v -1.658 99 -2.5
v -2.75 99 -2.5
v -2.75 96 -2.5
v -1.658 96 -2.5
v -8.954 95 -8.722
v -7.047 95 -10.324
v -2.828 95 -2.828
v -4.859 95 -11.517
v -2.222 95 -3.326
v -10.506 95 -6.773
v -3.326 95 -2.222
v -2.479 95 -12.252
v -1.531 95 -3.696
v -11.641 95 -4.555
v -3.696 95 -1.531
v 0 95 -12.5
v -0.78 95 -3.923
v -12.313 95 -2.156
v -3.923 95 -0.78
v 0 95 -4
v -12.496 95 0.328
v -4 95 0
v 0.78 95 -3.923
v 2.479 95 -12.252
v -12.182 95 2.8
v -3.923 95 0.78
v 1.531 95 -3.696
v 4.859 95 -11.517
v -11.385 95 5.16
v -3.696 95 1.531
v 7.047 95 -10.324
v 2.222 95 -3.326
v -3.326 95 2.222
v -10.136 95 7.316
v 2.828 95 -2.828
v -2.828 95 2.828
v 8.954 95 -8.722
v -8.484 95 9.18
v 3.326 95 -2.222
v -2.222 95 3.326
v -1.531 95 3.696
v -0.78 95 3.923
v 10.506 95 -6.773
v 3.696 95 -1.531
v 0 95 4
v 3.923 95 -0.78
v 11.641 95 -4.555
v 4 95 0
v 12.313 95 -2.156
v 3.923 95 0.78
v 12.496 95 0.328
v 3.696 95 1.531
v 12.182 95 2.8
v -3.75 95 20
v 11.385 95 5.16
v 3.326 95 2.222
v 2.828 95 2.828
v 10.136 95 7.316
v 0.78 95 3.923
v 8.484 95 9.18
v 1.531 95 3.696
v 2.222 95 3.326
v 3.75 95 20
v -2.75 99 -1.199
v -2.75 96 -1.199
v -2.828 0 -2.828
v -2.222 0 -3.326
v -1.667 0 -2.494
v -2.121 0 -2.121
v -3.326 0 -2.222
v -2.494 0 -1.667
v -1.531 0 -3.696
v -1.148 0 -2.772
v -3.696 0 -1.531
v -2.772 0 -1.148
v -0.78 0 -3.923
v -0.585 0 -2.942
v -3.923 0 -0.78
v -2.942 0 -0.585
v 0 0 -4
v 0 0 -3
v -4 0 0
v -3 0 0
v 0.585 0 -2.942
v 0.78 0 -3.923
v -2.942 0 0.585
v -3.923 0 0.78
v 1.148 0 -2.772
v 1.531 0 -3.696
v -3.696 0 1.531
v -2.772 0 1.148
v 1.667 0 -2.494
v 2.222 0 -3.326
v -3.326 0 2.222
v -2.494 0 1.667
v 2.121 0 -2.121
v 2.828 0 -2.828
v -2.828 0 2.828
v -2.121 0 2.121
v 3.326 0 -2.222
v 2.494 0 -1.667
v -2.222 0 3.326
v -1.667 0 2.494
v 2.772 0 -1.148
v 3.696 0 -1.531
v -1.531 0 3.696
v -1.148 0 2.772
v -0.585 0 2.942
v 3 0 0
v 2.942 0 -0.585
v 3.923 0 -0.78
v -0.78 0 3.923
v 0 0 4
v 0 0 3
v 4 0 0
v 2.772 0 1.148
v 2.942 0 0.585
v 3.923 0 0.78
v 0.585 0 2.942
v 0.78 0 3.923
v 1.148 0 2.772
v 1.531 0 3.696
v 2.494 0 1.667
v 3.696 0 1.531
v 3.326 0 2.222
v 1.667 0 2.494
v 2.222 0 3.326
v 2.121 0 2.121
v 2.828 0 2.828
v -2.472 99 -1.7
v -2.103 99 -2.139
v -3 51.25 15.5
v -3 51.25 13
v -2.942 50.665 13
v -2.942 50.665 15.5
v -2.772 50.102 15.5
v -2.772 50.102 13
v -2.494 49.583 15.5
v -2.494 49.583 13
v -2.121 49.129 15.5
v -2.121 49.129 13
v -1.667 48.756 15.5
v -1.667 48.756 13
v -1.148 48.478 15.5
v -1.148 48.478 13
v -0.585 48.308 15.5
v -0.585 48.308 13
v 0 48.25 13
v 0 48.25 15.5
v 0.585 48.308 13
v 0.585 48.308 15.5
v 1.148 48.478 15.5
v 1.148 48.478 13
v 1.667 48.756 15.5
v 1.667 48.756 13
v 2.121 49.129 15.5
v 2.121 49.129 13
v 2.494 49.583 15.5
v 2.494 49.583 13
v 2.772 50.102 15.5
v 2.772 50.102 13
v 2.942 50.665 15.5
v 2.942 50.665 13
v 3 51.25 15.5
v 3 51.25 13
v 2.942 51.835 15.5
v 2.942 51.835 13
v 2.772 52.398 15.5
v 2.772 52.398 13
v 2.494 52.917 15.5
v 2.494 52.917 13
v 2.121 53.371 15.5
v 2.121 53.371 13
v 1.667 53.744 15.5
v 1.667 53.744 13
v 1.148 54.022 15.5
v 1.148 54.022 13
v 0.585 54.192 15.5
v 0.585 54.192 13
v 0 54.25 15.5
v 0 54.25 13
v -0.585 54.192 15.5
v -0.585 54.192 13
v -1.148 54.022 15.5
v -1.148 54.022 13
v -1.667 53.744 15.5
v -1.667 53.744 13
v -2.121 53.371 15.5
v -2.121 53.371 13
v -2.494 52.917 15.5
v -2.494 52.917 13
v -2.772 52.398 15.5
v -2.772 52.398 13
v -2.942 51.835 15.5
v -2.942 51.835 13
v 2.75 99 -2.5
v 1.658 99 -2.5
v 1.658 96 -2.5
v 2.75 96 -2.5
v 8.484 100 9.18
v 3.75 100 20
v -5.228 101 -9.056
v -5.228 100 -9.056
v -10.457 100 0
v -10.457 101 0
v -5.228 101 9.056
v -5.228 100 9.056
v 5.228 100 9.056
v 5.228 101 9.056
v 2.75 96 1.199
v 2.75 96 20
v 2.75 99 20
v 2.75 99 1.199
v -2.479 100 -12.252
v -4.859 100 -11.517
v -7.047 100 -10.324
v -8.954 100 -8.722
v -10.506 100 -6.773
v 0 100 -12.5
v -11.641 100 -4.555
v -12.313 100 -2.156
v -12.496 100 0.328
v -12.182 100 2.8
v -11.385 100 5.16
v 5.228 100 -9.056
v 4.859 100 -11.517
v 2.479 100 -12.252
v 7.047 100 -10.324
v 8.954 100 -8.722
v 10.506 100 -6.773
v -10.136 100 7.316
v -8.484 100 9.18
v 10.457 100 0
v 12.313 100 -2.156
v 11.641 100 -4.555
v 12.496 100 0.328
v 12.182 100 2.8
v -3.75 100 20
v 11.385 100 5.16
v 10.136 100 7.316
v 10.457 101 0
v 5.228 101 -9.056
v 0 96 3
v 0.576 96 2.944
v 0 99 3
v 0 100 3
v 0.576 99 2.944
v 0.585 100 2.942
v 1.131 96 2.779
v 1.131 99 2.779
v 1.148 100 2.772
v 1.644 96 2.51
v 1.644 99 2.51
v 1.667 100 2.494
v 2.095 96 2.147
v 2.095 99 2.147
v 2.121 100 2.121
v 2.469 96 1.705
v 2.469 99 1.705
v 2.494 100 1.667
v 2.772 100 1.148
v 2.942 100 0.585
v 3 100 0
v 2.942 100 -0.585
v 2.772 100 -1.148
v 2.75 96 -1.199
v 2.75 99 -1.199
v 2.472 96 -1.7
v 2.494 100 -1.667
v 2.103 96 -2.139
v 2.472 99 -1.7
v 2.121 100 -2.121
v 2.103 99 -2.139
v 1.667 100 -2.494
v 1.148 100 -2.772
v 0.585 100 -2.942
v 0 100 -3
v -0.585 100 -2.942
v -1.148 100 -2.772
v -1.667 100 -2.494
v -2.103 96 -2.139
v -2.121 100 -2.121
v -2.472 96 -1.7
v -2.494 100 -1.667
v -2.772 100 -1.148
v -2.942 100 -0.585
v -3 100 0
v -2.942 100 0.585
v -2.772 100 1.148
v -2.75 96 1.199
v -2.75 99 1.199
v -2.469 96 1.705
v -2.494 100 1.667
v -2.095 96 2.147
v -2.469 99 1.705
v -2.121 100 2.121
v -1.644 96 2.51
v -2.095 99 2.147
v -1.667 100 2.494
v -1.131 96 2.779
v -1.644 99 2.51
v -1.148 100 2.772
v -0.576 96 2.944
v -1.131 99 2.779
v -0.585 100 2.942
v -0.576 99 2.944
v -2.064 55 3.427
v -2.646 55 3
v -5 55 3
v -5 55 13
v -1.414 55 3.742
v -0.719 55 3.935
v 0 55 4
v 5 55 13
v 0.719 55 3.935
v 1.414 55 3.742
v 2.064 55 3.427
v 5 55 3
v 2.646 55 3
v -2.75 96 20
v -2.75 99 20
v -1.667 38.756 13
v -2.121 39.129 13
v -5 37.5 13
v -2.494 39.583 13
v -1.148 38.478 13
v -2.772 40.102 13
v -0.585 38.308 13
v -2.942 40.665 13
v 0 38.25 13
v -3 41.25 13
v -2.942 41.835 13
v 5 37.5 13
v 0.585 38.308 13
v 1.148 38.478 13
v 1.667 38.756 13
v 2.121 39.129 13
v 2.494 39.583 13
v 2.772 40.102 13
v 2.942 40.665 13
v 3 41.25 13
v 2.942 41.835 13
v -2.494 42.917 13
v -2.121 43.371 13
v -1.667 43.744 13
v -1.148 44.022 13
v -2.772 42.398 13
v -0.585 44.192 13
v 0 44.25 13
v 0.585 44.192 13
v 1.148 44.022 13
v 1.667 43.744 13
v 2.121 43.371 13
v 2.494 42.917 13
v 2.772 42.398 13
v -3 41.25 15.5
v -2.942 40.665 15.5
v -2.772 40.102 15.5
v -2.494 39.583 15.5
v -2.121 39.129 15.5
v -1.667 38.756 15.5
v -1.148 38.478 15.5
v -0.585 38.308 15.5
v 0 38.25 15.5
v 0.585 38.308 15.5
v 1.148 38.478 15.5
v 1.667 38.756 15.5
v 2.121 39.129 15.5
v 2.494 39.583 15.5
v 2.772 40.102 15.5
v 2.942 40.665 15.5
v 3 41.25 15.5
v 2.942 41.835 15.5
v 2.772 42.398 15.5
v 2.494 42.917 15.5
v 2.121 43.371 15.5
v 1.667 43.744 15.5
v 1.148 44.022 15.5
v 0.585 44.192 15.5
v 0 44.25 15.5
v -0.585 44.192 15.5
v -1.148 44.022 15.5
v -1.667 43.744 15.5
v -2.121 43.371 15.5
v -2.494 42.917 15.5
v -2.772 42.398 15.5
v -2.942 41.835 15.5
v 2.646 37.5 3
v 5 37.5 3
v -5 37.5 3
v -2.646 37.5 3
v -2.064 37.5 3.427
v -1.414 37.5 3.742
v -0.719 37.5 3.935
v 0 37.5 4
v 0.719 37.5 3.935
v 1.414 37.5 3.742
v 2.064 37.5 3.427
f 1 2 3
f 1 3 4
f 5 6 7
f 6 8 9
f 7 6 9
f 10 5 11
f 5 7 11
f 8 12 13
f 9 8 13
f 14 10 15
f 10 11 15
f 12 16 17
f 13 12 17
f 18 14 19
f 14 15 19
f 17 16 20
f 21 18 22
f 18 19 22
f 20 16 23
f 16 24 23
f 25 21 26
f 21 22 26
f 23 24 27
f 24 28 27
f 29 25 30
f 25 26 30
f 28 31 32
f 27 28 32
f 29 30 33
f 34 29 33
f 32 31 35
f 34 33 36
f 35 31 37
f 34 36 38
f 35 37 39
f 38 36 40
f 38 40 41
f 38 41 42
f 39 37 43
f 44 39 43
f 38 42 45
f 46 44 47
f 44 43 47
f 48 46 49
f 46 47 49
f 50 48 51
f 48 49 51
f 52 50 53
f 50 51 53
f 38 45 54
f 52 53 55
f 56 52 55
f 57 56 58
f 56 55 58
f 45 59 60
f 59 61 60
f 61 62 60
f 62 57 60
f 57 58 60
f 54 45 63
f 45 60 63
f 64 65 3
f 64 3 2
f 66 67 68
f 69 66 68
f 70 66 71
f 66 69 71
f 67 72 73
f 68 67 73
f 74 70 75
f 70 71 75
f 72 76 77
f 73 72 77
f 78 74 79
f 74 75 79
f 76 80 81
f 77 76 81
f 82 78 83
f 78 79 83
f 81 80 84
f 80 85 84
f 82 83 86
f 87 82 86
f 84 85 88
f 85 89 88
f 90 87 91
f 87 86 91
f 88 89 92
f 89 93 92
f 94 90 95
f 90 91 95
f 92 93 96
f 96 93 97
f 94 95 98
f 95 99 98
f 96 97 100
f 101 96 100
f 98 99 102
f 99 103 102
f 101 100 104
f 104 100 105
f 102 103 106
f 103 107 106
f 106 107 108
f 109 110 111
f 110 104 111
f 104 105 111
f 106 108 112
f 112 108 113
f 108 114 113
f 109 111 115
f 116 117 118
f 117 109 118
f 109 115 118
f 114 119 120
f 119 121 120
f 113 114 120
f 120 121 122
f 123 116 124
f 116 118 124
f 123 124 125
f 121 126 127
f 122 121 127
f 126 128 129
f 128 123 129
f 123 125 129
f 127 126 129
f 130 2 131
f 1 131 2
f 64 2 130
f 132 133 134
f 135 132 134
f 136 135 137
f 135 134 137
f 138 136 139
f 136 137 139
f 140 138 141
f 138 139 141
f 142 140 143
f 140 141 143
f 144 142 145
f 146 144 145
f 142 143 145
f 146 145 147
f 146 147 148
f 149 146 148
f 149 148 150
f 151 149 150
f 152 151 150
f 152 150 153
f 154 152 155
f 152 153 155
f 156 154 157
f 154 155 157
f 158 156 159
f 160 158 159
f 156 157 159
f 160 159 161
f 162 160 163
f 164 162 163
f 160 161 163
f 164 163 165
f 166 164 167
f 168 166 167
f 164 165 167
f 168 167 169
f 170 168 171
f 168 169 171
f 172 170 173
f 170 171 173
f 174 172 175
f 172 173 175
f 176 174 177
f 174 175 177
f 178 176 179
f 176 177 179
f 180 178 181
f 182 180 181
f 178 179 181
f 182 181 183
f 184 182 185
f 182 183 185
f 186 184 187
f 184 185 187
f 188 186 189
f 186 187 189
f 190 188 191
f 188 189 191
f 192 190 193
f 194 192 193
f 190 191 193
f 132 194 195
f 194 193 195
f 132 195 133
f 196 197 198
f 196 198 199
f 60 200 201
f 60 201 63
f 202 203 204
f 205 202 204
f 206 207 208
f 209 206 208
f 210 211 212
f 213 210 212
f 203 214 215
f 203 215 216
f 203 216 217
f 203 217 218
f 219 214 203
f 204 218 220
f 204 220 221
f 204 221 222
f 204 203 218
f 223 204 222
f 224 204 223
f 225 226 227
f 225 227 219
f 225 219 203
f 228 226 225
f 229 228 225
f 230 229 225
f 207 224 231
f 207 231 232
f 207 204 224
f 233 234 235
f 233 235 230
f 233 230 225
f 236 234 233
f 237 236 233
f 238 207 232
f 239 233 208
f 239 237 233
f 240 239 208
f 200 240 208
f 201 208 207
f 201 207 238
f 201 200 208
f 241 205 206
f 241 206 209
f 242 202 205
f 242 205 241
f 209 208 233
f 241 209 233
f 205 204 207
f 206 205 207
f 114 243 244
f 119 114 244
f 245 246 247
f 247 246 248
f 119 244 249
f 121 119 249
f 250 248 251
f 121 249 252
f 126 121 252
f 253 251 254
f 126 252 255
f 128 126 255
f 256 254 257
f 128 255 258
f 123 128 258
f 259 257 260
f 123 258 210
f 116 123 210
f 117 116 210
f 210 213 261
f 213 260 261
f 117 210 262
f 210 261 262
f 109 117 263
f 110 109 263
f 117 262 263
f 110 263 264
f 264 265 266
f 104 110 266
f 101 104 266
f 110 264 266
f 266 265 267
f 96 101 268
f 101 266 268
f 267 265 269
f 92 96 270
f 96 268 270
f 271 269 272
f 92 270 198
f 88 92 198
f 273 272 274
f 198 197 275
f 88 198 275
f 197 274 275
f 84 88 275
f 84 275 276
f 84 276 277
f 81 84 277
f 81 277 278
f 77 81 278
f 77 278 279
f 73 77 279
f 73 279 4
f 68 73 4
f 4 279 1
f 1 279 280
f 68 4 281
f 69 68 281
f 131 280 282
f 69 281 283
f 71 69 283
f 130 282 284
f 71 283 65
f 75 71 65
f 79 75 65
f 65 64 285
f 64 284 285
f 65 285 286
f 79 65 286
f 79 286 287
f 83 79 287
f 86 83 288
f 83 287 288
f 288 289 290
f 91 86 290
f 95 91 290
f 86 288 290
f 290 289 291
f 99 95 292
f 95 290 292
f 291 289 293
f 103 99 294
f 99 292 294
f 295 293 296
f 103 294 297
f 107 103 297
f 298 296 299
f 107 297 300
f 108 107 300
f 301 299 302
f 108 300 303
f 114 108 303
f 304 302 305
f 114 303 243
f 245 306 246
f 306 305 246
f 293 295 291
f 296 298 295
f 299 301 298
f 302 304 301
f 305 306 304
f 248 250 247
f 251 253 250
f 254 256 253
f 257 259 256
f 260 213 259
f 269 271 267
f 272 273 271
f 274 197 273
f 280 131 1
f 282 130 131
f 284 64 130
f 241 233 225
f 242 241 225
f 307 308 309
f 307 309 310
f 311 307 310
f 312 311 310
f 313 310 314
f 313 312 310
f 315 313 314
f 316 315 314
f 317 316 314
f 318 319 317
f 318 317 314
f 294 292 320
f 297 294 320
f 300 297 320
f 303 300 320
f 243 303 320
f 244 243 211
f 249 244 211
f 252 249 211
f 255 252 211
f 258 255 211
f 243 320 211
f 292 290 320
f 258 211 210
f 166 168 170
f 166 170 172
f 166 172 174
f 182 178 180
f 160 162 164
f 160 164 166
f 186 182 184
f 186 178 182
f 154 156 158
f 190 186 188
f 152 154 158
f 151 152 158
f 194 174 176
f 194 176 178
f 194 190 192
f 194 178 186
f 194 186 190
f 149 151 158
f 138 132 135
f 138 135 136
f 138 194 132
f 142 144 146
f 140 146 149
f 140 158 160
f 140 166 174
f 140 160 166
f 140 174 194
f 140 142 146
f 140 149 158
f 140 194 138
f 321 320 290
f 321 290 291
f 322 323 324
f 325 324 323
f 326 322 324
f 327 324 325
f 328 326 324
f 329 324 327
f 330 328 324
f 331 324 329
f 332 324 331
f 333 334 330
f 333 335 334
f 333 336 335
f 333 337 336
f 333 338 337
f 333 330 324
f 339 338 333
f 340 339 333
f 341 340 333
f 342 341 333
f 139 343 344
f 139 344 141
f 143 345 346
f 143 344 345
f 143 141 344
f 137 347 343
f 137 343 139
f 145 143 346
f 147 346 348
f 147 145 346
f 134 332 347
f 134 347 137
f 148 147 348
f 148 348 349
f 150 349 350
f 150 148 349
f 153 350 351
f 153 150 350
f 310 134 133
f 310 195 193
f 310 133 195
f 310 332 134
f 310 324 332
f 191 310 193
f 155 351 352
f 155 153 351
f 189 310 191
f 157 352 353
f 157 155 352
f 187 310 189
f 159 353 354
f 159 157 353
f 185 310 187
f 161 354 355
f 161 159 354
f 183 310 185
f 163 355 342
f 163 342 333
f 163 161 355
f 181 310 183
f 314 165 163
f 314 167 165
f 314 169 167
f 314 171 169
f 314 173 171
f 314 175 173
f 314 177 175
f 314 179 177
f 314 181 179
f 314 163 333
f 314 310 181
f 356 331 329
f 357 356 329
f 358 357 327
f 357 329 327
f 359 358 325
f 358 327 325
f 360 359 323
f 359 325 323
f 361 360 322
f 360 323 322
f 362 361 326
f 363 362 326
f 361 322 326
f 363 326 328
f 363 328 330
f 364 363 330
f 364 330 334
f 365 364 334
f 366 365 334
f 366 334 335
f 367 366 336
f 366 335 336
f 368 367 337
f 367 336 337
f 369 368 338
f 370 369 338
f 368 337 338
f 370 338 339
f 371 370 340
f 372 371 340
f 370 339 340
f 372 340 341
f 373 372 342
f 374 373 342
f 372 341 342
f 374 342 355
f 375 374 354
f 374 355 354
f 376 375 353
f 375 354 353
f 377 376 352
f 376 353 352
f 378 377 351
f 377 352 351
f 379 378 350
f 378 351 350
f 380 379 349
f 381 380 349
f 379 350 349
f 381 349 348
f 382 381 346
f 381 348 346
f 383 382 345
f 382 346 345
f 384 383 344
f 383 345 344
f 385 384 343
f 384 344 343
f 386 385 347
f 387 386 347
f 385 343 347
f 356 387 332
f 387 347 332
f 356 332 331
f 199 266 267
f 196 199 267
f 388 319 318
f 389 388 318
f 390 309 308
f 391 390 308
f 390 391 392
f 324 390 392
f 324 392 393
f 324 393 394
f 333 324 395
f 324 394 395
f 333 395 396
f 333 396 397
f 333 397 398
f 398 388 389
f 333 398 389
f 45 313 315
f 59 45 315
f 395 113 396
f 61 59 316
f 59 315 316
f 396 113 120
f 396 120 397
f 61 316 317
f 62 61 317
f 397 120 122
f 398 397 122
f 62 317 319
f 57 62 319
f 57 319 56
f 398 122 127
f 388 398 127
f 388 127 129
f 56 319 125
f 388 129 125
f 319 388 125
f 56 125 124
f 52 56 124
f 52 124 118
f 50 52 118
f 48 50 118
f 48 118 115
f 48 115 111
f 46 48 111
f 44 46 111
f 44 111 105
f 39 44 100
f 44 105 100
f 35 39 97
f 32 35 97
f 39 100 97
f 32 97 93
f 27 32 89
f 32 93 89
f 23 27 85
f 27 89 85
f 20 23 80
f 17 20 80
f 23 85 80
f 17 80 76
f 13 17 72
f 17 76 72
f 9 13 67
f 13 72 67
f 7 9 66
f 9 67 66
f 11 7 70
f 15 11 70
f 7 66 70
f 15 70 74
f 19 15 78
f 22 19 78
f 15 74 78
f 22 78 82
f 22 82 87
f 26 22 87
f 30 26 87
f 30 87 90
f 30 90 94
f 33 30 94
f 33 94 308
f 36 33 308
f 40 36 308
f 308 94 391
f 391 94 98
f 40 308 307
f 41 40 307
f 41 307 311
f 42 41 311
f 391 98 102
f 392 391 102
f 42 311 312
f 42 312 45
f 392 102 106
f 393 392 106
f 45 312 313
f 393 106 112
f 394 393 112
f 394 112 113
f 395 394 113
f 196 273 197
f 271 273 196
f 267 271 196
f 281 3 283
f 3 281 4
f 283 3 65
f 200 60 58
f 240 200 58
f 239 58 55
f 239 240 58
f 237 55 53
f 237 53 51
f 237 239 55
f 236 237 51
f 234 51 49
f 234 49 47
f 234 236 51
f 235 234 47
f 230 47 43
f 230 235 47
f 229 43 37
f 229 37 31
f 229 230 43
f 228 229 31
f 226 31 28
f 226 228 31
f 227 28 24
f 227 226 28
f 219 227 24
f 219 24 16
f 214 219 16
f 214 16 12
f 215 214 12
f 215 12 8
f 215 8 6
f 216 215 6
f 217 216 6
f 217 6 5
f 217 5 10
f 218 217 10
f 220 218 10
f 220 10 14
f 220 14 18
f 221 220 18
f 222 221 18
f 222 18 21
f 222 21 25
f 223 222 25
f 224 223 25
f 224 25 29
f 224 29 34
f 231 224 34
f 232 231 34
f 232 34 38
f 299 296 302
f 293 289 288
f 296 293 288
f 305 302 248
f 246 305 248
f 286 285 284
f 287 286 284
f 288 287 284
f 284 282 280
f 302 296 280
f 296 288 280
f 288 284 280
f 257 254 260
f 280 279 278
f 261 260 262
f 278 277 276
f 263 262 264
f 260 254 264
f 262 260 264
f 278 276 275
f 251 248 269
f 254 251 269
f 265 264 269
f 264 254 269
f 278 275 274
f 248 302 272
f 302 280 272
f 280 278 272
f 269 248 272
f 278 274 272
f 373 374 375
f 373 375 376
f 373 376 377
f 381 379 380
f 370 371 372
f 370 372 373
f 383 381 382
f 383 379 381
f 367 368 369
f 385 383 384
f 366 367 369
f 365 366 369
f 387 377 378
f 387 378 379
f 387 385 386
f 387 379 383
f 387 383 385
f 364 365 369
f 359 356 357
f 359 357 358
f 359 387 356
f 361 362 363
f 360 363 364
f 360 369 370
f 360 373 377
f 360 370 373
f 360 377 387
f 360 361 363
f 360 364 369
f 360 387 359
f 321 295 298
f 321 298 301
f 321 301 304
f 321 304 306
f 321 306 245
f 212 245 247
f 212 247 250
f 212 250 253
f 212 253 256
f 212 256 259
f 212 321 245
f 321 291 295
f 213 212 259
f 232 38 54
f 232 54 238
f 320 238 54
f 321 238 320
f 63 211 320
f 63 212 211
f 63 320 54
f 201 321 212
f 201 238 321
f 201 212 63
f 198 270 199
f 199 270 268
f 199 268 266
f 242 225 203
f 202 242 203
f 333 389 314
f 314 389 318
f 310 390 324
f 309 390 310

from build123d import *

# Parameters (mm, degrees)
SKETCH1_R            = 4
BOSS_EXTRUDE1_DEPTH  = 100
SKETCH2_R            = 3
CUT_EXTRUDE1_DEPTH   = 101.159872204
SKETCH3_R            = 12.5
BOSS_EXTRUDE2_DEPTH  = 5
SKETCH9_W            = 5.5
SKETCH9_H            = 3
CUT_EXTRUDE2_DEPTH   = 22.5
SKETCH2_2_R          = 3
CUT_EXTRUDE3_DEPTH   = 103.743612972
BOSS_EXTRUDE6_DEPTH  = 1
SKETCH18_W           = 10
SKETCH18_H           = 17.5
BOSS_EXTRUDE10_DEPTH = 10
SKETCH19_R           = 3
BOSS_EXTRUDE11_DEPTH = 2.5


with BuildPart() as part:
    # Sketch1 → Boss-Extrude1 (new body)
    with BuildSketch(Plane(origin=(0, 0, 0), x_dir=(1, 0, 0), z_dir=(0, 1, 0))):
        Circle(SKETCH1_R)
    extrude(amount=BOSS_EXTRUDE1_DEPTH)

    # Sketch2 → Cut-Extrude1 (cut, through all)
    with BuildSketch(Plane(origin=(0, 100, 0), x_dir=(1, 0, 0), z_dir=(0, 1, 0))):
        Circle(SKETCH2_R)
    extrude(amount=-CUT_EXTRUDE1_DEPTH, mode=Mode.SUBTRACT)

    # Sketch3 → Boss-Extrude2 (add)
    with BuildSketch(Plane(origin=(0, 100, 0), x_dir=(1, 0, 0), z_dir=(0, 1, 0))):
        Circle(SKETCH3_R)
    extrude(amount=-BOSS_EXTRUDE2_DEPTH)

    # Sketch5 → Loft2 section 0
    with BuildSketch(Plane.XY):
        with BuildLine():
            Line((-12.5, 100), (12.5, 100))
            Line((12.5, 100), (12.5, 95))
            Line((12.5, 95), (-12.5, 95))
            Line((-12.5, 95), (-12.5, 100))
        make_face()
    # Sketch4 → Loft2 section 1
    with BuildSketch(Plane.XY.offset(20)):
        with BuildLine():
            Line((-3.75, 100), (3.75, 100))
            Line((3.75, 100), (3.75, 95))
            Line((3.75, 95), (-3.75, 95))
            Line((-3.75, 95), (-3.75, 100))
        make_face()
    loft()

    # Sketch9 → Cut-Extrude2 (cut)
    with BuildSketch(Plane.XY.offset(20)):
        with Locations((0, 97.5)):
            Rectangle(SKETCH9_W, SKETCH9_H)
    extrude(amount=-CUT_EXTRUDE2_DEPTH, mode=Mode.SUBTRACT)

    # Sketch2<2> → Cut-Extrude3 (cut, through all)
    with BuildSketch(Plane(origin=(0, 100, 0), x_dir=(1, 0, 0), z_dir=(0, 1, 0))):
        Circle(SKETCH2_2_R)
    extrude(amount=-CUT_EXTRUDE3_DEPTH, mode=Mode.SUBTRACT)

    # Sketch14 → Boss-Extrude6 (add)
    with BuildSketch(Plane(origin=(0, 100, 0), x_dir=(1, 0, 0), z_dir=(0, 1, 0))):
        Polygon((10.456538619, 0), (5.22826931, 9.05562808), (-5.22826931, 9.05562808), (-10.456538619, 0), (-5.22826931, -9.05562808), (5.22826931, -9.05562808), align=None)
    extrude(amount=BOSS_EXTRUDE6_DEPTH)

    # Sketch18 → Boss-Extrude10 (add)
    with BuildSketch(Plane.XY.offset(3)):
        with Locations((0, 46.25)):
            Rectangle(SKETCH18_W, SKETCH18_H)
    extrude(amount=BOSS_EXTRUDE10_DEPTH)

    # Sketch19 → Boss-Extrude11 (add)
    with BuildSketch(Plane.XY.offset(13)):
        with Locations((0, 51.25)):
            Circle(SKETCH19_R)
        with Locations((0, 41.25)):
            Circle(SKETCH19_R)
    extrude(amount=BOSS_EXTRUDE11_DEPTH)


solid = part.part
